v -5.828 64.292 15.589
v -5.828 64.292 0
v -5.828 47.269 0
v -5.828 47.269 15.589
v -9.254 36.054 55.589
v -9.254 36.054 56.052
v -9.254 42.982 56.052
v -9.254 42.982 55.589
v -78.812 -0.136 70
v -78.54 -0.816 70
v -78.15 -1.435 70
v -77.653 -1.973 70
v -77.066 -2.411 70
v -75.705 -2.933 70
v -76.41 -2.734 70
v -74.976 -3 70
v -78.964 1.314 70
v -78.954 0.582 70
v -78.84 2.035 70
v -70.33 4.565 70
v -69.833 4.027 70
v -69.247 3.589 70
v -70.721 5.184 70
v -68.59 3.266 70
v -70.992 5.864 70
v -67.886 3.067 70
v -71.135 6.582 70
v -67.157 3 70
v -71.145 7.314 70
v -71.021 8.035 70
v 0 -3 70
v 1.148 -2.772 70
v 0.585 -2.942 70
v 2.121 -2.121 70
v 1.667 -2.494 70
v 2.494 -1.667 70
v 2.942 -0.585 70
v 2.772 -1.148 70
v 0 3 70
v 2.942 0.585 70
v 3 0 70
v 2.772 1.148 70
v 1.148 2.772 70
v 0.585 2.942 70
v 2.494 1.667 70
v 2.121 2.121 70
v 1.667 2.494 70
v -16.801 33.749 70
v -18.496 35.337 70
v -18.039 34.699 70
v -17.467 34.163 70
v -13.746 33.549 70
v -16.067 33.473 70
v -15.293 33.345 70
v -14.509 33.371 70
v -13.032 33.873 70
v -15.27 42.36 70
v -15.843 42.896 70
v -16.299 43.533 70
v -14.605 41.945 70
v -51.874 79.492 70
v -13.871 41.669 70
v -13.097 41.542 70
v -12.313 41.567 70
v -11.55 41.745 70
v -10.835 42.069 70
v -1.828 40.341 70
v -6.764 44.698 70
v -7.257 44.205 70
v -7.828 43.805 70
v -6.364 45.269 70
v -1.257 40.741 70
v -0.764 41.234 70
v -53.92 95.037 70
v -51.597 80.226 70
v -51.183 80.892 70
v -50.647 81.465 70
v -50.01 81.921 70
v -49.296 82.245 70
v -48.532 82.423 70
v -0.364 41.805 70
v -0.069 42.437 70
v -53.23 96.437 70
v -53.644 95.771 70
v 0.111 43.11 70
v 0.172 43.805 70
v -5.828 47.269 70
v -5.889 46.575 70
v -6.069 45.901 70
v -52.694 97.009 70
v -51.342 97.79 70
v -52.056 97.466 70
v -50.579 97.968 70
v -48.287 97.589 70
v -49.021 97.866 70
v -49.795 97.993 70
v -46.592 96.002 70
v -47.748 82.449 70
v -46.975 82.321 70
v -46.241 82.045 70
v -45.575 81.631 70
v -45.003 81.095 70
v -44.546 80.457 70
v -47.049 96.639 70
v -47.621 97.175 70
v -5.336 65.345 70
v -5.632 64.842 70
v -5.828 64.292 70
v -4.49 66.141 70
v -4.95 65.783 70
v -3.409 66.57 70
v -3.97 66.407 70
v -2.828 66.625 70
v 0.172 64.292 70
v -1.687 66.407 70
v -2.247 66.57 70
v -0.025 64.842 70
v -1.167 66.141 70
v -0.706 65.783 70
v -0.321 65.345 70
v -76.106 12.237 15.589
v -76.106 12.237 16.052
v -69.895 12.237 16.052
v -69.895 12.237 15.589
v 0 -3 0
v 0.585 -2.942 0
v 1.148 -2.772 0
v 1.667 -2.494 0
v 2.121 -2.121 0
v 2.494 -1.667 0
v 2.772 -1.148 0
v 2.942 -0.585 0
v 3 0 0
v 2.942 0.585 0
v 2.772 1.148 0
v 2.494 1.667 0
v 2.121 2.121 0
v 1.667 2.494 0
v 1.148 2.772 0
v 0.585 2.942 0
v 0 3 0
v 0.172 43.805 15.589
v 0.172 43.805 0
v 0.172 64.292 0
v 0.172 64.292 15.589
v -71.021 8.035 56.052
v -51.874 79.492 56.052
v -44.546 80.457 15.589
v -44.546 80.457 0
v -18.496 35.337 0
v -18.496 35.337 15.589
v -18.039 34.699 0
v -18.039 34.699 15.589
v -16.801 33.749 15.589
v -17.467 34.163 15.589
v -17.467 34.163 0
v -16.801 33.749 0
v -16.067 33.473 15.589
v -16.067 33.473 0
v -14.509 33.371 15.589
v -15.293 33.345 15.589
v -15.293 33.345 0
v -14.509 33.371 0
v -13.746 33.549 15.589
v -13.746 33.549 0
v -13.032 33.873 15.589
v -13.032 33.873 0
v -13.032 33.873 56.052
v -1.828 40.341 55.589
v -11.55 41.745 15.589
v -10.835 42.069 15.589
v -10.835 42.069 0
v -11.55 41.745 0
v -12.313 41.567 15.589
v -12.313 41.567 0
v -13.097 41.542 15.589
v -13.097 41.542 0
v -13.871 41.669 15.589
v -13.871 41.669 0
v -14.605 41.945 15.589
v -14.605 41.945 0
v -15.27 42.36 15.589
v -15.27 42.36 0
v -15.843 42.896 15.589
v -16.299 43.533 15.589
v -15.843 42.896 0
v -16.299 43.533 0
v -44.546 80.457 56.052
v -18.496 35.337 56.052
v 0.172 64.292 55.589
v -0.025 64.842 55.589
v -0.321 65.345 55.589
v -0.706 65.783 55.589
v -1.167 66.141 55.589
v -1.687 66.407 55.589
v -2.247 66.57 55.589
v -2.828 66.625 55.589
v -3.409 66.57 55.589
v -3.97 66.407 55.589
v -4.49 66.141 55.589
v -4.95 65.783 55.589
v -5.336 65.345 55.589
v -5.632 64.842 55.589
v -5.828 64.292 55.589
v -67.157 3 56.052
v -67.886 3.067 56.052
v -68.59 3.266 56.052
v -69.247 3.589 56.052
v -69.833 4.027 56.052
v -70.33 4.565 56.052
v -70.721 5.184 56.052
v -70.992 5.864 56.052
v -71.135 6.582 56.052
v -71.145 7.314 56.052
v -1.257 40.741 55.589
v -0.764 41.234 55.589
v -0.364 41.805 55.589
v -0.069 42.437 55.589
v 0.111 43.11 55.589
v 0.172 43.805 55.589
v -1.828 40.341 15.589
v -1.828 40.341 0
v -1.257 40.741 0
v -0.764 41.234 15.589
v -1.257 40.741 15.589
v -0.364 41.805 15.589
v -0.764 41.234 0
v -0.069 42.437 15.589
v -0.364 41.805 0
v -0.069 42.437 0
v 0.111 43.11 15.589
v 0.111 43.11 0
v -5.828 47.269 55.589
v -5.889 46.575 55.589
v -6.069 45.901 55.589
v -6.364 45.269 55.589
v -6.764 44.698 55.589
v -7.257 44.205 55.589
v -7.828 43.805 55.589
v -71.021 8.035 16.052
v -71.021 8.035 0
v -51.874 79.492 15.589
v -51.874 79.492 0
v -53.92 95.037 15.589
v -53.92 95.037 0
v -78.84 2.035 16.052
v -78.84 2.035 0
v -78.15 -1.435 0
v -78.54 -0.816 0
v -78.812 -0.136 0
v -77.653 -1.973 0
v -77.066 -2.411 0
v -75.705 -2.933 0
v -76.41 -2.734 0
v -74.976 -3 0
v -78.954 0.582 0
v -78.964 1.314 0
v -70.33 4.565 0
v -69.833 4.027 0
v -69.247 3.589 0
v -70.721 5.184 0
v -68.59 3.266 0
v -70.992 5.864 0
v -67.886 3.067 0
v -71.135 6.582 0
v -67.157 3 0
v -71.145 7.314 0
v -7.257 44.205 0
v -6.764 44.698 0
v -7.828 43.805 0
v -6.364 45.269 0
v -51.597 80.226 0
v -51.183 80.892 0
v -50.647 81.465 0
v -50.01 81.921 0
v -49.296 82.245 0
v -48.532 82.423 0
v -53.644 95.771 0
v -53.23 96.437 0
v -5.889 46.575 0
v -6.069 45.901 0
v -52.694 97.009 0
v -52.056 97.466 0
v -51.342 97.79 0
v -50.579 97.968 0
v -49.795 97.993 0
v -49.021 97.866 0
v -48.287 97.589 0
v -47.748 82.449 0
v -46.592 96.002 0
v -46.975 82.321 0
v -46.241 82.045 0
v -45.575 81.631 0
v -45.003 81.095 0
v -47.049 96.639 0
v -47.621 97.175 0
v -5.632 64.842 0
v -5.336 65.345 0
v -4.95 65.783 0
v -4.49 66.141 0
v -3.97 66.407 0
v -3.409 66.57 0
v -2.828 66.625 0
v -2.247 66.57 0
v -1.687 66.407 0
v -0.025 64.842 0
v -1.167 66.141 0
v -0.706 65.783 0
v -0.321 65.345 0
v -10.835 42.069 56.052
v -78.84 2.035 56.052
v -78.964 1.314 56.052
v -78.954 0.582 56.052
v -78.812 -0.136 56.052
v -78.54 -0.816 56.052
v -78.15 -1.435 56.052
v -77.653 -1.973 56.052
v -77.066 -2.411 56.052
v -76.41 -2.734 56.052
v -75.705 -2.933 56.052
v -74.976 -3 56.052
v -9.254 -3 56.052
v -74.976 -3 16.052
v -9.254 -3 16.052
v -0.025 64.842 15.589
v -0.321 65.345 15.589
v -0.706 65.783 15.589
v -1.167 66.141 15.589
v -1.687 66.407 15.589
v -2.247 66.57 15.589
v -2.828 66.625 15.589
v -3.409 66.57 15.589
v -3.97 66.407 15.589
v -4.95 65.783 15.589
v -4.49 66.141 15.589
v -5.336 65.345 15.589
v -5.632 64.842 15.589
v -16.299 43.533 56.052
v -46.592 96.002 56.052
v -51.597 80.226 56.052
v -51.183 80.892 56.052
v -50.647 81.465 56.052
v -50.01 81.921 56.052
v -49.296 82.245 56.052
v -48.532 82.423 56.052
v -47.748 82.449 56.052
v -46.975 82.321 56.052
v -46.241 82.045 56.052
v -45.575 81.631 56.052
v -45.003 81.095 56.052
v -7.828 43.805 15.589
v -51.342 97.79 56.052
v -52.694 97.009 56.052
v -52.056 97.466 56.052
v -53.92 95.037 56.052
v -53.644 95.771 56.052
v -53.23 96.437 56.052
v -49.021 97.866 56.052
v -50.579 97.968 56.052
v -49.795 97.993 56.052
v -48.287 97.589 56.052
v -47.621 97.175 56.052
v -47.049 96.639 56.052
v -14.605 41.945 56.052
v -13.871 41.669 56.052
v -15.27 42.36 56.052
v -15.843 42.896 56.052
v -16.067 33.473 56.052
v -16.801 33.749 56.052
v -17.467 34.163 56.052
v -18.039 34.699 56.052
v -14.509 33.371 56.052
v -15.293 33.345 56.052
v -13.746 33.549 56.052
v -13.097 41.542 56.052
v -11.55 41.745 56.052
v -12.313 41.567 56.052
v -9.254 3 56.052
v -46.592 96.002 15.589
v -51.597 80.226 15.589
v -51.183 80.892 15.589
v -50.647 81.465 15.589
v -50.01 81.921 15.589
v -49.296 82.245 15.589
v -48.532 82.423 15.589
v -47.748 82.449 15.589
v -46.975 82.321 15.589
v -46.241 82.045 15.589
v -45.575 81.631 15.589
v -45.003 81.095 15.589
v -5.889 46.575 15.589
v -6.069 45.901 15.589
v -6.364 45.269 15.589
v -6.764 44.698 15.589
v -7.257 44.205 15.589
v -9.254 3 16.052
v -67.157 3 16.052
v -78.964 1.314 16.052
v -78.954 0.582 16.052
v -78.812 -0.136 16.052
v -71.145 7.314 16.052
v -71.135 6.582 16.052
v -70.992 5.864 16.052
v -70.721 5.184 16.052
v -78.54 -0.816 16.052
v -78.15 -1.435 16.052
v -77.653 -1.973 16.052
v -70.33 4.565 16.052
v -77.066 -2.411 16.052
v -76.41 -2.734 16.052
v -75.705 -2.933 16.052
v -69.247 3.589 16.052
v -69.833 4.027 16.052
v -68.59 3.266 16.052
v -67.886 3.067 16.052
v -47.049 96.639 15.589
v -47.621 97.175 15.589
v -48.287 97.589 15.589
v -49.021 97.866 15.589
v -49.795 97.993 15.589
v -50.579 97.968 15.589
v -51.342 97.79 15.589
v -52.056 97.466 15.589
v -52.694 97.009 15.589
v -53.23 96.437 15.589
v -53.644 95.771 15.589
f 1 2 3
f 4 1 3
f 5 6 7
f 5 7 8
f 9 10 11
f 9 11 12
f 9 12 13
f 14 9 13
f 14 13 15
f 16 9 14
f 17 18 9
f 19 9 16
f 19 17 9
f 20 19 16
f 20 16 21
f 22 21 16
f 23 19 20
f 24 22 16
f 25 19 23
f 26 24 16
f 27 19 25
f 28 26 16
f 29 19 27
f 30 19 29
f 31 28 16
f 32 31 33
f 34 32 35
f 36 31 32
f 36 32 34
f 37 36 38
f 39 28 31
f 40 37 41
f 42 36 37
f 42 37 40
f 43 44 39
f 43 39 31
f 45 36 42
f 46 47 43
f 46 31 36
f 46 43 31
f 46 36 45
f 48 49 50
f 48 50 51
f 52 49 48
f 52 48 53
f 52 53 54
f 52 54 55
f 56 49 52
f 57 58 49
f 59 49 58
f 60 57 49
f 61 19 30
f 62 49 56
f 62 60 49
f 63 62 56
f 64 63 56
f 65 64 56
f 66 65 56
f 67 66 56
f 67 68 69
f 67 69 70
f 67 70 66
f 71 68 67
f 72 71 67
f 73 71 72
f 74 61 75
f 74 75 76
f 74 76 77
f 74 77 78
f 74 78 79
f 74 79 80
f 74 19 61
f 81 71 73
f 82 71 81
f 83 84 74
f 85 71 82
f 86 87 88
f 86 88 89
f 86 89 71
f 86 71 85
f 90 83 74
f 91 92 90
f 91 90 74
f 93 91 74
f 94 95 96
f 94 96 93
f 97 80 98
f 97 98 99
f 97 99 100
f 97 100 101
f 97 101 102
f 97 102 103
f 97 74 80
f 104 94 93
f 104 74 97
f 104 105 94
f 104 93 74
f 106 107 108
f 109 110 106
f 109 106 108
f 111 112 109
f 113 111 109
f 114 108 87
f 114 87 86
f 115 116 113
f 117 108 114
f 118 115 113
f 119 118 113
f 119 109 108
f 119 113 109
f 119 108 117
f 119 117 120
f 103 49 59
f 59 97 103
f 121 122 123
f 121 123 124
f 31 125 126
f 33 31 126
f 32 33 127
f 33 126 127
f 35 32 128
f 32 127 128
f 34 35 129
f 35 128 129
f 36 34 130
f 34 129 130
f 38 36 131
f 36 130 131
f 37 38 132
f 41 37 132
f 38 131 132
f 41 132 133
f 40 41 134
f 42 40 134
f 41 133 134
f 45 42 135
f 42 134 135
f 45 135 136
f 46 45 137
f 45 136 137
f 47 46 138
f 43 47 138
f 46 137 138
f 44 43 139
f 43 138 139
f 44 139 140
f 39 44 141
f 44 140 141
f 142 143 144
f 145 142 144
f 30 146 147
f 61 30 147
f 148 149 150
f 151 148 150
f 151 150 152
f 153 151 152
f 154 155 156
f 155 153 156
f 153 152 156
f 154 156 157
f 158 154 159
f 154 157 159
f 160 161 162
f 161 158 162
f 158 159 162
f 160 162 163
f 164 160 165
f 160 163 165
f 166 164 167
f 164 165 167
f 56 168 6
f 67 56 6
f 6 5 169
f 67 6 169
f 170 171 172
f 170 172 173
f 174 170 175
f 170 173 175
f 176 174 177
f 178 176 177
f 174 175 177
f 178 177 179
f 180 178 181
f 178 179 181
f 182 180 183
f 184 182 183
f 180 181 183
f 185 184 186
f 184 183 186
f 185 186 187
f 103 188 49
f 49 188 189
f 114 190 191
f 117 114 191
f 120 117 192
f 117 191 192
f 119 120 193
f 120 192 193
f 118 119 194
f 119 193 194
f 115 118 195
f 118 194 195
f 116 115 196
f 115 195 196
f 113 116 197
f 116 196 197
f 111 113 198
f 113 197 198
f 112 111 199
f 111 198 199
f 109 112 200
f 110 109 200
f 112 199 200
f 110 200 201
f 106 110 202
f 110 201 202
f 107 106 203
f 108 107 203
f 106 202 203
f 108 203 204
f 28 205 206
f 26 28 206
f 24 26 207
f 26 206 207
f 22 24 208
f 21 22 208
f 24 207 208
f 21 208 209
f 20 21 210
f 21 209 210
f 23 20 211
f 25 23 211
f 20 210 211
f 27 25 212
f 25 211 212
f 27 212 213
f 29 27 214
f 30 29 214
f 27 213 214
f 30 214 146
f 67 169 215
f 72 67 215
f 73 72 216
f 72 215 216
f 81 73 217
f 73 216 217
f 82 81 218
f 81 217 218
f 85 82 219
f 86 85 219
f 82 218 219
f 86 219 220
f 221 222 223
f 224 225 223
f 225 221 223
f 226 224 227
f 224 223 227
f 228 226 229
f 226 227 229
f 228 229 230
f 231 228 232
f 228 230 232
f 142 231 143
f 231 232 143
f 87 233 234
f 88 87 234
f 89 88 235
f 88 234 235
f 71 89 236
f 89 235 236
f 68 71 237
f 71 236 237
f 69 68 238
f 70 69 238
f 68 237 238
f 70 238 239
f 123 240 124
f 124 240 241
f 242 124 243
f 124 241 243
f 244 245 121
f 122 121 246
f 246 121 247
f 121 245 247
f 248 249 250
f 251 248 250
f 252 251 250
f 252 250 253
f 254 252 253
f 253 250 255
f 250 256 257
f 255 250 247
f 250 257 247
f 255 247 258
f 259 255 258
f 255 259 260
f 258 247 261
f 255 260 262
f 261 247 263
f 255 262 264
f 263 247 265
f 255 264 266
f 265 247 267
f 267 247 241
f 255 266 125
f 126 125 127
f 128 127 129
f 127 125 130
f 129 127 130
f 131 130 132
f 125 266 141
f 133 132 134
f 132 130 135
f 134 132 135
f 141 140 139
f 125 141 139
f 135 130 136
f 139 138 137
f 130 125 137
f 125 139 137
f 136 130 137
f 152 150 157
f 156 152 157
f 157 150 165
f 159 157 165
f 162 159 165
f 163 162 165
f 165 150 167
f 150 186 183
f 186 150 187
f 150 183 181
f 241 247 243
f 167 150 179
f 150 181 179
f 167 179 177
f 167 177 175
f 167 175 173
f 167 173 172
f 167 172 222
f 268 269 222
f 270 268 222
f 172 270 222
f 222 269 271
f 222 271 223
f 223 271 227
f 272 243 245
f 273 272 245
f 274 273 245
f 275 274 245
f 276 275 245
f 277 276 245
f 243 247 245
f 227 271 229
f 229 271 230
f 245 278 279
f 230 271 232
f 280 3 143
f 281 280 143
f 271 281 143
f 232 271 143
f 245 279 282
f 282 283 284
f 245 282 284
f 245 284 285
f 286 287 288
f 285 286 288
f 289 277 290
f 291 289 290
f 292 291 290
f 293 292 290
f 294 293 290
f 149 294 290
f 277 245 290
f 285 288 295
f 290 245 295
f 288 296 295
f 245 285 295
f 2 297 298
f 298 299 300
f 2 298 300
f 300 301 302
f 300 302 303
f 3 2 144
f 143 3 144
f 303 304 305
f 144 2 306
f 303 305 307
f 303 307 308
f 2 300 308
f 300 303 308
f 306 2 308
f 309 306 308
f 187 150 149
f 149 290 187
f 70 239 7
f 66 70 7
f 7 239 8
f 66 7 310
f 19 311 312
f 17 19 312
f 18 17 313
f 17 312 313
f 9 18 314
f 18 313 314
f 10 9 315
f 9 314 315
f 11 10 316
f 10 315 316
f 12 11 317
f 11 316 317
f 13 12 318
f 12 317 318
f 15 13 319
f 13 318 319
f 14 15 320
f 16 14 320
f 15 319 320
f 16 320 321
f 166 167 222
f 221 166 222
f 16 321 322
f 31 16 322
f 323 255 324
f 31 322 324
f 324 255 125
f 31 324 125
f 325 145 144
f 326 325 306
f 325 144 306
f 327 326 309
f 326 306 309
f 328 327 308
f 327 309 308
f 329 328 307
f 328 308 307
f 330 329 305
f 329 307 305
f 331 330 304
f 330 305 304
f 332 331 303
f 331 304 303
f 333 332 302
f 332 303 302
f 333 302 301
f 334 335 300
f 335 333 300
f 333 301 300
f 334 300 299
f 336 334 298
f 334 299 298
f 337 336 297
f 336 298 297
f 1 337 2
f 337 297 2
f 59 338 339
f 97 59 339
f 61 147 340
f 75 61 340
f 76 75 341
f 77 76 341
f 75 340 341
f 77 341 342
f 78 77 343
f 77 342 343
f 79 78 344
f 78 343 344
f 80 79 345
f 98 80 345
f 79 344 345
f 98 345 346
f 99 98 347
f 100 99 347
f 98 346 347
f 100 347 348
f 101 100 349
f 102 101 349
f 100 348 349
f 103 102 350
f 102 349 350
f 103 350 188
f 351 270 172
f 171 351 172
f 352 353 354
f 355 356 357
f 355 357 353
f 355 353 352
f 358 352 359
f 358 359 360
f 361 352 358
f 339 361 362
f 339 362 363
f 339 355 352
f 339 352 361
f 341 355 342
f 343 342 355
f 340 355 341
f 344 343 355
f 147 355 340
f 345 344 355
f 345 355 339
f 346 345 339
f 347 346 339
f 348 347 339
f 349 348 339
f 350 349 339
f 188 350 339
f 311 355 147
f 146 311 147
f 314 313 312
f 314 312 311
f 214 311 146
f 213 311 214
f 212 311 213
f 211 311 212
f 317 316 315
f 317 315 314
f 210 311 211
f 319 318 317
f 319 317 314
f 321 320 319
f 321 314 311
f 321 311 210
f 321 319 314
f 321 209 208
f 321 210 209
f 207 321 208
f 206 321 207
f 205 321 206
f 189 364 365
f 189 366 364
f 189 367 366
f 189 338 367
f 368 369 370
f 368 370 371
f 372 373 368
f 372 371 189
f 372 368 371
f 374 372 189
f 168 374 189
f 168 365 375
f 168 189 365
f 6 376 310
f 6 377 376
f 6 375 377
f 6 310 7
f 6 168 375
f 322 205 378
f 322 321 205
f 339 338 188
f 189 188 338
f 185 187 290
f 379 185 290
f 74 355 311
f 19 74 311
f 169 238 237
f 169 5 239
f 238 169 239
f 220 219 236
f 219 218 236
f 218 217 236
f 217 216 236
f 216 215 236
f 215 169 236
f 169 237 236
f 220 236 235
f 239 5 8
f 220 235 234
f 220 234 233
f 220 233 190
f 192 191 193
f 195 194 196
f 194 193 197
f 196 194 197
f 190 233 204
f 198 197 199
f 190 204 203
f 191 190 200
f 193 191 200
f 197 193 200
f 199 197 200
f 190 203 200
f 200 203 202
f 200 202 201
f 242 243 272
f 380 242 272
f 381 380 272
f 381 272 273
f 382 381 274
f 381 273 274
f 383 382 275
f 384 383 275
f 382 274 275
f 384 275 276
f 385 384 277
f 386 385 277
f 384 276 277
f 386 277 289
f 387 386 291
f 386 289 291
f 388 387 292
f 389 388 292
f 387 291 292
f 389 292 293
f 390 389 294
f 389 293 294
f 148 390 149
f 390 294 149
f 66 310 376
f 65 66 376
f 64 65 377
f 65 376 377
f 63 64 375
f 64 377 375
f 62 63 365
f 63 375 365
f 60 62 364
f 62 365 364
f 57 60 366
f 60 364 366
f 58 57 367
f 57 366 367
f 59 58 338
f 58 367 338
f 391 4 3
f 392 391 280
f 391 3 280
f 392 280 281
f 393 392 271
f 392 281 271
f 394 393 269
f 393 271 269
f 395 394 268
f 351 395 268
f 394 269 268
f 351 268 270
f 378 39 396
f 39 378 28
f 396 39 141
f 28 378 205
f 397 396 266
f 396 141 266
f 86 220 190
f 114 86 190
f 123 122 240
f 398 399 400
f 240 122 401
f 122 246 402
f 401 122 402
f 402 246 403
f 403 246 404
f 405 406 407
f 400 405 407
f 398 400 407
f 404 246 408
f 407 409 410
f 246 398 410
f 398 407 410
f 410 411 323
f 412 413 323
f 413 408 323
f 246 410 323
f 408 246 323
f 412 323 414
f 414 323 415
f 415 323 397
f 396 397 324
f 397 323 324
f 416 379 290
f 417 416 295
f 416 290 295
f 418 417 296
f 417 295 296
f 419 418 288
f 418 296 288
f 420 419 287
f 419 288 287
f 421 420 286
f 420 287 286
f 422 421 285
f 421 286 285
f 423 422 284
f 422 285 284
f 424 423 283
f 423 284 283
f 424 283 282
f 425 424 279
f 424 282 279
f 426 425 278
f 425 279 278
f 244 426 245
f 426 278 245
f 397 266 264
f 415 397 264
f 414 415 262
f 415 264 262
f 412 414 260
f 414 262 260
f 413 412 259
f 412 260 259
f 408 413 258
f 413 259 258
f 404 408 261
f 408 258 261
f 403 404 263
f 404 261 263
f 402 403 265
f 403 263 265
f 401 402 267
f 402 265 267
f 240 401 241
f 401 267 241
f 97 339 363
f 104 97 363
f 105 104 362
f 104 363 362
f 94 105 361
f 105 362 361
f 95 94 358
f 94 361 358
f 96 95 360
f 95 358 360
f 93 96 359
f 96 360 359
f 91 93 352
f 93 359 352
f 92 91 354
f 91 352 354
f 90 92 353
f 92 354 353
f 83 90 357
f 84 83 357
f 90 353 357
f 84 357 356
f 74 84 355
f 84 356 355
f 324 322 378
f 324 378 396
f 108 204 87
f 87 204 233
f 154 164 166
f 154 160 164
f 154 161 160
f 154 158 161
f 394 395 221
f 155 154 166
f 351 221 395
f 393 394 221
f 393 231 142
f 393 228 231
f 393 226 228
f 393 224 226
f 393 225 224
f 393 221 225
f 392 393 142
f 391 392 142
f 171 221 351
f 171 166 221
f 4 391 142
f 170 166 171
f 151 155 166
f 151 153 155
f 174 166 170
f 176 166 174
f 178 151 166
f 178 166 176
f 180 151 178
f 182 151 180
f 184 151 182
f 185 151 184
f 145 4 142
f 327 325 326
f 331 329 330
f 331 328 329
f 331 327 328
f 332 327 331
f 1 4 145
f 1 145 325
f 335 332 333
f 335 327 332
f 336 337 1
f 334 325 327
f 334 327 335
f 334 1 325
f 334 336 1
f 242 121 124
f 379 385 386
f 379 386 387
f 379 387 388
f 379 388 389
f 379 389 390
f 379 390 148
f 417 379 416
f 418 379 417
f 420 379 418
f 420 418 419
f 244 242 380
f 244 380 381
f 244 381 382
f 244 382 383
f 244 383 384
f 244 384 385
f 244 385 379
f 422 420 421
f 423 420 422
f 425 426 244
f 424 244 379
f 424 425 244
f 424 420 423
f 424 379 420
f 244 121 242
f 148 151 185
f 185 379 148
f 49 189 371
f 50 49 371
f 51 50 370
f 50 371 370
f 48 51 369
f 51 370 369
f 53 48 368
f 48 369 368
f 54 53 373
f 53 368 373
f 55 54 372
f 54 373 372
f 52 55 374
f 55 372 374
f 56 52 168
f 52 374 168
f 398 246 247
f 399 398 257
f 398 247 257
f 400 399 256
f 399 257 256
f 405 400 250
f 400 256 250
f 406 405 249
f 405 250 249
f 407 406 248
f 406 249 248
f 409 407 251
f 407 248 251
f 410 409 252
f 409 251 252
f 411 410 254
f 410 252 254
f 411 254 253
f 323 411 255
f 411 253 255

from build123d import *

# Parameters (mm, degrees)
BOSS_EXTRUDE1_DEPTH     = 70
CUT_EXTRUDE3_DEPTH      = 145.019444896
CUT_EXTRUDE3_DEPTH_BACK = 145.019444896
SKETCH2_W               = 40
SKETCH2_H               = 90
CUT_EXTRUDE4_DEPTH      = 145.019444896
CUT_EXTRUDE4_DEPTH_BACK = 145.019444896
SKETCH3_W               = 74.200339426
SKETCH3_H               = 40


with BuildPart() as part:
    # Sketch1 → Boss-Extrude1 (new body)
    with BuildSketch(Plane.XY):
        with BuildLine():
            Line((0, 3), (-67.156880159, 3))
            ThreePointArc((-67.156880159, 3), (-70.33029352, 4.564954284), (-71.020583464, 8.03527618))
            Line((-71.020583464, 8.03527618), (-51.873686922, 79.492466883))
            ThreePointArc((-51.873686922, 79.492466883), (-48.532088385, 82.422970148), (-44.545882001, 80.457190703))
            Line((-44.545882001, 80.457190703), (-18.49562947, 35.336829768))
            ThreePointArc((-18.49562947, 35.336829768), (-16.066804035, 33.473126463), (-13.031527854, 33.872728153))
            Line((-13.031527854, 33.872728153), (-1.828193725, 40.340976128))
            ThreePointArc((-1.828193725, 40.340976128), (-0.36409211, 41.805077743), (0.171806275, 43.805077743))
            Line((0.171806275, 43.805077743), (0.171806275, 64.29182561))
            ThreePointArc((0.171806275, 64.29182561), (-2.828193725, 66.625142685), (-5.828193725, 64.29182561))
            Line((-5.828193725, 64.29182561), (-5.828193725, 47.269179358))
            ThreePointArc((-5.828193725, 47.269179358), (-6.36409211, 45.269179358), (-7.828193725, 43.805077743))
            Line((-7.828193725, 43.805077743), (-10.835375432, 42.068880575))
            ThreePointArc((-10.835375432, 42.068880575), (-13.870651612, 41.669278885), (-16.299477047, 43.53298219))
            Line((-16.299477047, 43.53298219), (-46.592370266, 96.001812354))
            ThreePointArc((-46.592370266, 96.001812354), (-50.57857665, 97.967591799), (-53.920175186, 95.037088534))
            Line((-53.920175186, 95.037088534), (-78.839935701, 2.03527618))
            ThreePointArc((-78.839935701, 2.03527618), (-78.149645757, -1.435045716), (-74.976232396, -3))
            Line((-74.976232396, -3), (0, -3))
            ThreePointArc((0, -3), (3, 0), (0, 3))
        make_face()
    extrude(amount=BOSS_EXTRUDE1_DEPTH)

    # Sketch2 → Cut-Extrude3 (cut, two sides: drawn at the far end of the back side and taken through both)
    with BuildSketch(Plane(origin=(0, 0, 0), x_dir=(0, 0, -1), z_dir=(1, 0, 0)).offset(-CUT_EXTRUDE3_DEPTH_BACK)):
        with Locations((-35.588760561, 57.237154529)):
            Rectangle(SKETCH2_W, SKETCH2_H)
    extrude(amount=CUT_EXTRUDE3_DEPTH + CUT_EXTRUDE3_DEPTH_BACK, mode=Mode.SUBTRACT)

    # Sketch3 → Cut-Extrude4 (cut, two sides: drawn at the far end of the back side and taken through both)
    with BuildSketch(Plane(origin=(0, 0, 0), x_dir=(1, 0, 0), z_dir=(0, 1, 0)).offset(-CUT_EXTRUDE4_DEPTH_BACK)):
        with Locations((-46.354271726, -36.051698815)):
            Rectangle(SKETCH3_W, SKETCH3_H)
    extrude(amount=CUT_EXTRUDE4_DEPTH + CUT_EXTRUDE4_DEPTH_BACK, mode=Mode.SUBTRACT)


solid = part.part
